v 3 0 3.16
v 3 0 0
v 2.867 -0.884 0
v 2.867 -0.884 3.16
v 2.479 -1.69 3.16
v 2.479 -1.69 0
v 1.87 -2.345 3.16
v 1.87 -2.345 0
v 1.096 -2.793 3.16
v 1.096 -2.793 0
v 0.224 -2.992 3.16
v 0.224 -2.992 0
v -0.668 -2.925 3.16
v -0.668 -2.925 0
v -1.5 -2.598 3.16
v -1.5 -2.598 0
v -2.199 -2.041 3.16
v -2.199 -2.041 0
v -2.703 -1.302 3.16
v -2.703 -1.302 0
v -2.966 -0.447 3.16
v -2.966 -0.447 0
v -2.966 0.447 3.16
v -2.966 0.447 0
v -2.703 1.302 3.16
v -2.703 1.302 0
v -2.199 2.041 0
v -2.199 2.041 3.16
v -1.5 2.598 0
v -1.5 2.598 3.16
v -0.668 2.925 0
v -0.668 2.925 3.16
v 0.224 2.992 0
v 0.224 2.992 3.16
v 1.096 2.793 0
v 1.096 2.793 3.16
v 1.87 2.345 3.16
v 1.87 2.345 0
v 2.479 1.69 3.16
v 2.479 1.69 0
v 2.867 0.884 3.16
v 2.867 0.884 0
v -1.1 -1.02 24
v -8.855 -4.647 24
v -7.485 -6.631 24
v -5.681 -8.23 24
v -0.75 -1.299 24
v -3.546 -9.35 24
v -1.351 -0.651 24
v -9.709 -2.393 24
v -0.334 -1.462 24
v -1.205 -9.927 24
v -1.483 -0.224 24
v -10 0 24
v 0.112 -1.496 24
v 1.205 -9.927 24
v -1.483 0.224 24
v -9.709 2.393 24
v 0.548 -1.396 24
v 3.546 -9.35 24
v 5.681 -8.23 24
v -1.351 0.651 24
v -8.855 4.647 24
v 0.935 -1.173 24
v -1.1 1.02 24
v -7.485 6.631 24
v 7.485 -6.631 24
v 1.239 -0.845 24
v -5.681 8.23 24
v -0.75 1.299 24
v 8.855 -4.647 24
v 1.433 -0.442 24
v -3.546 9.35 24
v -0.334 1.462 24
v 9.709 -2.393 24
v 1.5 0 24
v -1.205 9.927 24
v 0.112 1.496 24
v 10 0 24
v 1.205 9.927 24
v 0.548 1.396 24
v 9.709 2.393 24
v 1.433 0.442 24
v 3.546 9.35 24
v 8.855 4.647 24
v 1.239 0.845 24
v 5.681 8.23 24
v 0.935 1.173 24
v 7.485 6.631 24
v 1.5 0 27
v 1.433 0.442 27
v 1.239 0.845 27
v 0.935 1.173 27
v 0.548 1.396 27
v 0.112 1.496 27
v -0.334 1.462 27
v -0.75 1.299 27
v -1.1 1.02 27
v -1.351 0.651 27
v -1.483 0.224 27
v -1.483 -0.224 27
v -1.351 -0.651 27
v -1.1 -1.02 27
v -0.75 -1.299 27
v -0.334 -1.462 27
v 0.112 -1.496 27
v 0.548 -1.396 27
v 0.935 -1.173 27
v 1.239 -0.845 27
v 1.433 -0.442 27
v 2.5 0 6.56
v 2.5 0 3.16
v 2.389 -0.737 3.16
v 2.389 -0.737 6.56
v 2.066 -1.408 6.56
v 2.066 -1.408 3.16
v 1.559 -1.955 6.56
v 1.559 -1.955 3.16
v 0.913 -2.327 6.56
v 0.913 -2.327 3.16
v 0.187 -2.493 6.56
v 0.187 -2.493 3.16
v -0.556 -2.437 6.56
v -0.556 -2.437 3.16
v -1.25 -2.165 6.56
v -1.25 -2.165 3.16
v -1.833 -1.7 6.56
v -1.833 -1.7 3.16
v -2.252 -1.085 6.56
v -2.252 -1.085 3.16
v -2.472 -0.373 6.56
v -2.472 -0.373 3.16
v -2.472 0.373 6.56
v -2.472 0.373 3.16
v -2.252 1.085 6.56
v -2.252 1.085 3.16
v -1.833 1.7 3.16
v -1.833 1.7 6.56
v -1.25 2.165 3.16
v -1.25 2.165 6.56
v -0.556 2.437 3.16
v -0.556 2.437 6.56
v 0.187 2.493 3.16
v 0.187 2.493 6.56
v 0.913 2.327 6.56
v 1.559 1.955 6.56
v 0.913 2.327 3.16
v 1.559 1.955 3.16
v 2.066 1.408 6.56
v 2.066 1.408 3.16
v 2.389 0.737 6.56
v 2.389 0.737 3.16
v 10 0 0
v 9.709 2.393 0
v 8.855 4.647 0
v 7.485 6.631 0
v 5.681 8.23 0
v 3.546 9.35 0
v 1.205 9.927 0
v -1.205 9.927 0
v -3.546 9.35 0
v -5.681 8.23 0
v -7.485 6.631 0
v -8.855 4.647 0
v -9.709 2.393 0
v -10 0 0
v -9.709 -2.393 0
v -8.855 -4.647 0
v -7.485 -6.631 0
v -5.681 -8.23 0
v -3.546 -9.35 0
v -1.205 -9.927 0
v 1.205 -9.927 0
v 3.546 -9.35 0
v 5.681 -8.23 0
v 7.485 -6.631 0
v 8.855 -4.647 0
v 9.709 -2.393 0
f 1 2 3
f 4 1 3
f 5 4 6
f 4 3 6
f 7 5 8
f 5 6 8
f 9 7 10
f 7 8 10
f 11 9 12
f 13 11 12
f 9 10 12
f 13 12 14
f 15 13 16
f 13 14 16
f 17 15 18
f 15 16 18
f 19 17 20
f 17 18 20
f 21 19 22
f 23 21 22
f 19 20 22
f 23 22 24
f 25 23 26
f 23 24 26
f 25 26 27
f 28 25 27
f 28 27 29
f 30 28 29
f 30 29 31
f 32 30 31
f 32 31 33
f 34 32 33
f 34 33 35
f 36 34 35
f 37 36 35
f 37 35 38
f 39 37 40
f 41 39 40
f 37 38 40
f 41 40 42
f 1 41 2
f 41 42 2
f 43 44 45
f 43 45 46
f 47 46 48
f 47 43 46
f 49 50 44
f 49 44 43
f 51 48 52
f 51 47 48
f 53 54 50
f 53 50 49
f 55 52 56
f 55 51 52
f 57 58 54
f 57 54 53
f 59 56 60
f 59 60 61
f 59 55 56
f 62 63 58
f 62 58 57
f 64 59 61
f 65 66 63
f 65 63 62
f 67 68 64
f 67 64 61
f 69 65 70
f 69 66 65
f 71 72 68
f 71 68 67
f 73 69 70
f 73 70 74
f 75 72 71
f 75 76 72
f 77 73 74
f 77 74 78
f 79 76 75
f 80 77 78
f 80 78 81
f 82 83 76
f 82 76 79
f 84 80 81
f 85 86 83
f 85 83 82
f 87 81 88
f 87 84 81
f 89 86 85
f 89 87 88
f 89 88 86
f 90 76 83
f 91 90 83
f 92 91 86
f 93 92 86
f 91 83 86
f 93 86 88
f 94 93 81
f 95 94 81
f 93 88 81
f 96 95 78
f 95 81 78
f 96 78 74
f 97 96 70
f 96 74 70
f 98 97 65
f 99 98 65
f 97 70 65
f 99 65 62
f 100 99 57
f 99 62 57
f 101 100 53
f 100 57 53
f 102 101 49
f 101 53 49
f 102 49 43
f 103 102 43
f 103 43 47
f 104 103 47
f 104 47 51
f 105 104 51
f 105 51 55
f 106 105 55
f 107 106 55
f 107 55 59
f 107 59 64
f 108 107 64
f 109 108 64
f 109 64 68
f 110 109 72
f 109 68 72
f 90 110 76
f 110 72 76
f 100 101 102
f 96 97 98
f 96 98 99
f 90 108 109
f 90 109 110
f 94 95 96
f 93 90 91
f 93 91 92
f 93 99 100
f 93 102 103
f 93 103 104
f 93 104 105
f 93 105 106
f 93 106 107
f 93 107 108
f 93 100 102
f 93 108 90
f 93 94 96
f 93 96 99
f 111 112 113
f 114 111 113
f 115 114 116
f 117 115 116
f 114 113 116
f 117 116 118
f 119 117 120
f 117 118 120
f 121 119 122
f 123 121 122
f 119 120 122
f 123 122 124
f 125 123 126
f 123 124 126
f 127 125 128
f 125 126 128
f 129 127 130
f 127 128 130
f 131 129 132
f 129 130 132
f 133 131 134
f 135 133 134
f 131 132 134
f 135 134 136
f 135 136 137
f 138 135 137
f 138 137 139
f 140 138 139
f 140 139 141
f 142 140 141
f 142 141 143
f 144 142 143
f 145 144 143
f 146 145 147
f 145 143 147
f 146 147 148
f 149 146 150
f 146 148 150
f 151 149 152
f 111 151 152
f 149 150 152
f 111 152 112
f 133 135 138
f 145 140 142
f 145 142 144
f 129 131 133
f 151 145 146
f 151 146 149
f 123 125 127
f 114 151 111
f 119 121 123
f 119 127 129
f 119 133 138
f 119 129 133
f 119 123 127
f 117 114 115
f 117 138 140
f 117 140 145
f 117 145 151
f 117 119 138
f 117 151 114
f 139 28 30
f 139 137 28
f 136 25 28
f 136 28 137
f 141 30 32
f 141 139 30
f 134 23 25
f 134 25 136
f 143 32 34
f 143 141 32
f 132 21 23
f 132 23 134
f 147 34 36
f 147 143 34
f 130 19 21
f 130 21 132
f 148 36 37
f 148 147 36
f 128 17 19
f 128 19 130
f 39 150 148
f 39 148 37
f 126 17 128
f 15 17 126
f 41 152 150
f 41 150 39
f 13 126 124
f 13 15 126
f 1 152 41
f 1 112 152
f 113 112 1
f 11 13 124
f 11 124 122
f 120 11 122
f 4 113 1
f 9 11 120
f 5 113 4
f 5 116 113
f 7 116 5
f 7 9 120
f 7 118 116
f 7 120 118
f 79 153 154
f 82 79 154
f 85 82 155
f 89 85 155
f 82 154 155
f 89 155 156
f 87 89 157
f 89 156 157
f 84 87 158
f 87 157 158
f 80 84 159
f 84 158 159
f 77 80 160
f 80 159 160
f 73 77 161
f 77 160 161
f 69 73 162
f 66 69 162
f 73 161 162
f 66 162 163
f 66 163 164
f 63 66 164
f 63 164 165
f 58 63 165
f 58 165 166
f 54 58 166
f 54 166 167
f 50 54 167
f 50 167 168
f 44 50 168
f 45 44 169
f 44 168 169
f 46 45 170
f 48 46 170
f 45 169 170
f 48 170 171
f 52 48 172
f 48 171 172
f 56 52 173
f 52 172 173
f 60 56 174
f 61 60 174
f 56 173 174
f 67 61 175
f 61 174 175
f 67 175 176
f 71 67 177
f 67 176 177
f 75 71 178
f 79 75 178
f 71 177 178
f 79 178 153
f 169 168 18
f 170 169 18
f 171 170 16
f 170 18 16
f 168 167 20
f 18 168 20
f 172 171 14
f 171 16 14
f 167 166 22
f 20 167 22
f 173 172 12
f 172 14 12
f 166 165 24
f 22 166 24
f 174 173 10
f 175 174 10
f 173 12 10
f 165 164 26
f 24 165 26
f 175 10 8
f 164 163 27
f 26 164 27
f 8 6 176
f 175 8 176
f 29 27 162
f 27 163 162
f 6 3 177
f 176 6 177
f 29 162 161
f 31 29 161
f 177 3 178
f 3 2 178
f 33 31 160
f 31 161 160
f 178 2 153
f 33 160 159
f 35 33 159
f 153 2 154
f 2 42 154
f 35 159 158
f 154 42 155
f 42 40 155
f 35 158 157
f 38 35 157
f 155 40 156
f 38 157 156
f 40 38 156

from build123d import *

# Parameters (mm, degrees)
SKETCH_R        = 10
PAD_DEPTH       = 24
SKETCH001_R     = 1.5
PAD001_DEPTH    = 3
SKETCH002_R     = 3
POCKET_DEPTH    = 3.16
SKETCH003_R     = 2.5
POCKET001_DEPTH = 3.4


with BuildPart() as part:
    # Sketch → Pad (new body)
    with BuildSketch(Plane.XY):
        Circle(SKETCH_R)
    extrude(amount=PAD_DEPTH)

    # Sketch001 → Pad001 (new body)
    with BuildSketch(Plane.XY.offset(24)):
        Circle(SKETCH001_R)
    extrude(amount=PAD001_DEPTH)

    # Sketch002 → Pocket (cut)
    with BuildSketch(Plane(origin=(0, 0, 0), x_dir=(1, 0, 0), z_dir=(0, 0, -1))):
        Circle(SKETCH002_R)
    extrude(amount=-POCKET_DEPTH, mode=Mode.SUBTRACT)

    # Sketch003 → Pocket001 (cut)
    with BuildSketch(Plane(origin=(0, 0, 3.16), x_dir=(1, 0, 0), z_dir=(0, 0, -1))):
        Circle(SKETCH003_R)
    extrude(amount=-POCKET001_DEPTH, mode=Mode.SUBTRACT)


solid = part.part
